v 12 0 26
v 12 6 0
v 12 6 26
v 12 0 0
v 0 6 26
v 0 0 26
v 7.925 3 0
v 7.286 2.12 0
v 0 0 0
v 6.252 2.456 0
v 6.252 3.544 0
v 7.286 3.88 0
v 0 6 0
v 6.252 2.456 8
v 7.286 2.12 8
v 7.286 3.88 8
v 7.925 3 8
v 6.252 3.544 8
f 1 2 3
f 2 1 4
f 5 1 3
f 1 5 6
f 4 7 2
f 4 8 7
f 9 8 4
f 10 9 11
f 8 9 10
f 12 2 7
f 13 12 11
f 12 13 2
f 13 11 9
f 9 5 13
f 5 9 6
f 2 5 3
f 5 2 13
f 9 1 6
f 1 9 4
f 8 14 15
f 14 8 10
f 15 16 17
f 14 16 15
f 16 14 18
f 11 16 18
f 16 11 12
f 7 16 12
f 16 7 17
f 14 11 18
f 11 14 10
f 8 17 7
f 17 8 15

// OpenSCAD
difference(){
    
    union(){
        //Cross in key hole
        translate([0,0,0])
            cube([12,6,26]);
     
    }
    
    //Screw Cutout
    translate([7,3,-1])
        cylinder(9, 1.85/2, 1.85/2);
}
